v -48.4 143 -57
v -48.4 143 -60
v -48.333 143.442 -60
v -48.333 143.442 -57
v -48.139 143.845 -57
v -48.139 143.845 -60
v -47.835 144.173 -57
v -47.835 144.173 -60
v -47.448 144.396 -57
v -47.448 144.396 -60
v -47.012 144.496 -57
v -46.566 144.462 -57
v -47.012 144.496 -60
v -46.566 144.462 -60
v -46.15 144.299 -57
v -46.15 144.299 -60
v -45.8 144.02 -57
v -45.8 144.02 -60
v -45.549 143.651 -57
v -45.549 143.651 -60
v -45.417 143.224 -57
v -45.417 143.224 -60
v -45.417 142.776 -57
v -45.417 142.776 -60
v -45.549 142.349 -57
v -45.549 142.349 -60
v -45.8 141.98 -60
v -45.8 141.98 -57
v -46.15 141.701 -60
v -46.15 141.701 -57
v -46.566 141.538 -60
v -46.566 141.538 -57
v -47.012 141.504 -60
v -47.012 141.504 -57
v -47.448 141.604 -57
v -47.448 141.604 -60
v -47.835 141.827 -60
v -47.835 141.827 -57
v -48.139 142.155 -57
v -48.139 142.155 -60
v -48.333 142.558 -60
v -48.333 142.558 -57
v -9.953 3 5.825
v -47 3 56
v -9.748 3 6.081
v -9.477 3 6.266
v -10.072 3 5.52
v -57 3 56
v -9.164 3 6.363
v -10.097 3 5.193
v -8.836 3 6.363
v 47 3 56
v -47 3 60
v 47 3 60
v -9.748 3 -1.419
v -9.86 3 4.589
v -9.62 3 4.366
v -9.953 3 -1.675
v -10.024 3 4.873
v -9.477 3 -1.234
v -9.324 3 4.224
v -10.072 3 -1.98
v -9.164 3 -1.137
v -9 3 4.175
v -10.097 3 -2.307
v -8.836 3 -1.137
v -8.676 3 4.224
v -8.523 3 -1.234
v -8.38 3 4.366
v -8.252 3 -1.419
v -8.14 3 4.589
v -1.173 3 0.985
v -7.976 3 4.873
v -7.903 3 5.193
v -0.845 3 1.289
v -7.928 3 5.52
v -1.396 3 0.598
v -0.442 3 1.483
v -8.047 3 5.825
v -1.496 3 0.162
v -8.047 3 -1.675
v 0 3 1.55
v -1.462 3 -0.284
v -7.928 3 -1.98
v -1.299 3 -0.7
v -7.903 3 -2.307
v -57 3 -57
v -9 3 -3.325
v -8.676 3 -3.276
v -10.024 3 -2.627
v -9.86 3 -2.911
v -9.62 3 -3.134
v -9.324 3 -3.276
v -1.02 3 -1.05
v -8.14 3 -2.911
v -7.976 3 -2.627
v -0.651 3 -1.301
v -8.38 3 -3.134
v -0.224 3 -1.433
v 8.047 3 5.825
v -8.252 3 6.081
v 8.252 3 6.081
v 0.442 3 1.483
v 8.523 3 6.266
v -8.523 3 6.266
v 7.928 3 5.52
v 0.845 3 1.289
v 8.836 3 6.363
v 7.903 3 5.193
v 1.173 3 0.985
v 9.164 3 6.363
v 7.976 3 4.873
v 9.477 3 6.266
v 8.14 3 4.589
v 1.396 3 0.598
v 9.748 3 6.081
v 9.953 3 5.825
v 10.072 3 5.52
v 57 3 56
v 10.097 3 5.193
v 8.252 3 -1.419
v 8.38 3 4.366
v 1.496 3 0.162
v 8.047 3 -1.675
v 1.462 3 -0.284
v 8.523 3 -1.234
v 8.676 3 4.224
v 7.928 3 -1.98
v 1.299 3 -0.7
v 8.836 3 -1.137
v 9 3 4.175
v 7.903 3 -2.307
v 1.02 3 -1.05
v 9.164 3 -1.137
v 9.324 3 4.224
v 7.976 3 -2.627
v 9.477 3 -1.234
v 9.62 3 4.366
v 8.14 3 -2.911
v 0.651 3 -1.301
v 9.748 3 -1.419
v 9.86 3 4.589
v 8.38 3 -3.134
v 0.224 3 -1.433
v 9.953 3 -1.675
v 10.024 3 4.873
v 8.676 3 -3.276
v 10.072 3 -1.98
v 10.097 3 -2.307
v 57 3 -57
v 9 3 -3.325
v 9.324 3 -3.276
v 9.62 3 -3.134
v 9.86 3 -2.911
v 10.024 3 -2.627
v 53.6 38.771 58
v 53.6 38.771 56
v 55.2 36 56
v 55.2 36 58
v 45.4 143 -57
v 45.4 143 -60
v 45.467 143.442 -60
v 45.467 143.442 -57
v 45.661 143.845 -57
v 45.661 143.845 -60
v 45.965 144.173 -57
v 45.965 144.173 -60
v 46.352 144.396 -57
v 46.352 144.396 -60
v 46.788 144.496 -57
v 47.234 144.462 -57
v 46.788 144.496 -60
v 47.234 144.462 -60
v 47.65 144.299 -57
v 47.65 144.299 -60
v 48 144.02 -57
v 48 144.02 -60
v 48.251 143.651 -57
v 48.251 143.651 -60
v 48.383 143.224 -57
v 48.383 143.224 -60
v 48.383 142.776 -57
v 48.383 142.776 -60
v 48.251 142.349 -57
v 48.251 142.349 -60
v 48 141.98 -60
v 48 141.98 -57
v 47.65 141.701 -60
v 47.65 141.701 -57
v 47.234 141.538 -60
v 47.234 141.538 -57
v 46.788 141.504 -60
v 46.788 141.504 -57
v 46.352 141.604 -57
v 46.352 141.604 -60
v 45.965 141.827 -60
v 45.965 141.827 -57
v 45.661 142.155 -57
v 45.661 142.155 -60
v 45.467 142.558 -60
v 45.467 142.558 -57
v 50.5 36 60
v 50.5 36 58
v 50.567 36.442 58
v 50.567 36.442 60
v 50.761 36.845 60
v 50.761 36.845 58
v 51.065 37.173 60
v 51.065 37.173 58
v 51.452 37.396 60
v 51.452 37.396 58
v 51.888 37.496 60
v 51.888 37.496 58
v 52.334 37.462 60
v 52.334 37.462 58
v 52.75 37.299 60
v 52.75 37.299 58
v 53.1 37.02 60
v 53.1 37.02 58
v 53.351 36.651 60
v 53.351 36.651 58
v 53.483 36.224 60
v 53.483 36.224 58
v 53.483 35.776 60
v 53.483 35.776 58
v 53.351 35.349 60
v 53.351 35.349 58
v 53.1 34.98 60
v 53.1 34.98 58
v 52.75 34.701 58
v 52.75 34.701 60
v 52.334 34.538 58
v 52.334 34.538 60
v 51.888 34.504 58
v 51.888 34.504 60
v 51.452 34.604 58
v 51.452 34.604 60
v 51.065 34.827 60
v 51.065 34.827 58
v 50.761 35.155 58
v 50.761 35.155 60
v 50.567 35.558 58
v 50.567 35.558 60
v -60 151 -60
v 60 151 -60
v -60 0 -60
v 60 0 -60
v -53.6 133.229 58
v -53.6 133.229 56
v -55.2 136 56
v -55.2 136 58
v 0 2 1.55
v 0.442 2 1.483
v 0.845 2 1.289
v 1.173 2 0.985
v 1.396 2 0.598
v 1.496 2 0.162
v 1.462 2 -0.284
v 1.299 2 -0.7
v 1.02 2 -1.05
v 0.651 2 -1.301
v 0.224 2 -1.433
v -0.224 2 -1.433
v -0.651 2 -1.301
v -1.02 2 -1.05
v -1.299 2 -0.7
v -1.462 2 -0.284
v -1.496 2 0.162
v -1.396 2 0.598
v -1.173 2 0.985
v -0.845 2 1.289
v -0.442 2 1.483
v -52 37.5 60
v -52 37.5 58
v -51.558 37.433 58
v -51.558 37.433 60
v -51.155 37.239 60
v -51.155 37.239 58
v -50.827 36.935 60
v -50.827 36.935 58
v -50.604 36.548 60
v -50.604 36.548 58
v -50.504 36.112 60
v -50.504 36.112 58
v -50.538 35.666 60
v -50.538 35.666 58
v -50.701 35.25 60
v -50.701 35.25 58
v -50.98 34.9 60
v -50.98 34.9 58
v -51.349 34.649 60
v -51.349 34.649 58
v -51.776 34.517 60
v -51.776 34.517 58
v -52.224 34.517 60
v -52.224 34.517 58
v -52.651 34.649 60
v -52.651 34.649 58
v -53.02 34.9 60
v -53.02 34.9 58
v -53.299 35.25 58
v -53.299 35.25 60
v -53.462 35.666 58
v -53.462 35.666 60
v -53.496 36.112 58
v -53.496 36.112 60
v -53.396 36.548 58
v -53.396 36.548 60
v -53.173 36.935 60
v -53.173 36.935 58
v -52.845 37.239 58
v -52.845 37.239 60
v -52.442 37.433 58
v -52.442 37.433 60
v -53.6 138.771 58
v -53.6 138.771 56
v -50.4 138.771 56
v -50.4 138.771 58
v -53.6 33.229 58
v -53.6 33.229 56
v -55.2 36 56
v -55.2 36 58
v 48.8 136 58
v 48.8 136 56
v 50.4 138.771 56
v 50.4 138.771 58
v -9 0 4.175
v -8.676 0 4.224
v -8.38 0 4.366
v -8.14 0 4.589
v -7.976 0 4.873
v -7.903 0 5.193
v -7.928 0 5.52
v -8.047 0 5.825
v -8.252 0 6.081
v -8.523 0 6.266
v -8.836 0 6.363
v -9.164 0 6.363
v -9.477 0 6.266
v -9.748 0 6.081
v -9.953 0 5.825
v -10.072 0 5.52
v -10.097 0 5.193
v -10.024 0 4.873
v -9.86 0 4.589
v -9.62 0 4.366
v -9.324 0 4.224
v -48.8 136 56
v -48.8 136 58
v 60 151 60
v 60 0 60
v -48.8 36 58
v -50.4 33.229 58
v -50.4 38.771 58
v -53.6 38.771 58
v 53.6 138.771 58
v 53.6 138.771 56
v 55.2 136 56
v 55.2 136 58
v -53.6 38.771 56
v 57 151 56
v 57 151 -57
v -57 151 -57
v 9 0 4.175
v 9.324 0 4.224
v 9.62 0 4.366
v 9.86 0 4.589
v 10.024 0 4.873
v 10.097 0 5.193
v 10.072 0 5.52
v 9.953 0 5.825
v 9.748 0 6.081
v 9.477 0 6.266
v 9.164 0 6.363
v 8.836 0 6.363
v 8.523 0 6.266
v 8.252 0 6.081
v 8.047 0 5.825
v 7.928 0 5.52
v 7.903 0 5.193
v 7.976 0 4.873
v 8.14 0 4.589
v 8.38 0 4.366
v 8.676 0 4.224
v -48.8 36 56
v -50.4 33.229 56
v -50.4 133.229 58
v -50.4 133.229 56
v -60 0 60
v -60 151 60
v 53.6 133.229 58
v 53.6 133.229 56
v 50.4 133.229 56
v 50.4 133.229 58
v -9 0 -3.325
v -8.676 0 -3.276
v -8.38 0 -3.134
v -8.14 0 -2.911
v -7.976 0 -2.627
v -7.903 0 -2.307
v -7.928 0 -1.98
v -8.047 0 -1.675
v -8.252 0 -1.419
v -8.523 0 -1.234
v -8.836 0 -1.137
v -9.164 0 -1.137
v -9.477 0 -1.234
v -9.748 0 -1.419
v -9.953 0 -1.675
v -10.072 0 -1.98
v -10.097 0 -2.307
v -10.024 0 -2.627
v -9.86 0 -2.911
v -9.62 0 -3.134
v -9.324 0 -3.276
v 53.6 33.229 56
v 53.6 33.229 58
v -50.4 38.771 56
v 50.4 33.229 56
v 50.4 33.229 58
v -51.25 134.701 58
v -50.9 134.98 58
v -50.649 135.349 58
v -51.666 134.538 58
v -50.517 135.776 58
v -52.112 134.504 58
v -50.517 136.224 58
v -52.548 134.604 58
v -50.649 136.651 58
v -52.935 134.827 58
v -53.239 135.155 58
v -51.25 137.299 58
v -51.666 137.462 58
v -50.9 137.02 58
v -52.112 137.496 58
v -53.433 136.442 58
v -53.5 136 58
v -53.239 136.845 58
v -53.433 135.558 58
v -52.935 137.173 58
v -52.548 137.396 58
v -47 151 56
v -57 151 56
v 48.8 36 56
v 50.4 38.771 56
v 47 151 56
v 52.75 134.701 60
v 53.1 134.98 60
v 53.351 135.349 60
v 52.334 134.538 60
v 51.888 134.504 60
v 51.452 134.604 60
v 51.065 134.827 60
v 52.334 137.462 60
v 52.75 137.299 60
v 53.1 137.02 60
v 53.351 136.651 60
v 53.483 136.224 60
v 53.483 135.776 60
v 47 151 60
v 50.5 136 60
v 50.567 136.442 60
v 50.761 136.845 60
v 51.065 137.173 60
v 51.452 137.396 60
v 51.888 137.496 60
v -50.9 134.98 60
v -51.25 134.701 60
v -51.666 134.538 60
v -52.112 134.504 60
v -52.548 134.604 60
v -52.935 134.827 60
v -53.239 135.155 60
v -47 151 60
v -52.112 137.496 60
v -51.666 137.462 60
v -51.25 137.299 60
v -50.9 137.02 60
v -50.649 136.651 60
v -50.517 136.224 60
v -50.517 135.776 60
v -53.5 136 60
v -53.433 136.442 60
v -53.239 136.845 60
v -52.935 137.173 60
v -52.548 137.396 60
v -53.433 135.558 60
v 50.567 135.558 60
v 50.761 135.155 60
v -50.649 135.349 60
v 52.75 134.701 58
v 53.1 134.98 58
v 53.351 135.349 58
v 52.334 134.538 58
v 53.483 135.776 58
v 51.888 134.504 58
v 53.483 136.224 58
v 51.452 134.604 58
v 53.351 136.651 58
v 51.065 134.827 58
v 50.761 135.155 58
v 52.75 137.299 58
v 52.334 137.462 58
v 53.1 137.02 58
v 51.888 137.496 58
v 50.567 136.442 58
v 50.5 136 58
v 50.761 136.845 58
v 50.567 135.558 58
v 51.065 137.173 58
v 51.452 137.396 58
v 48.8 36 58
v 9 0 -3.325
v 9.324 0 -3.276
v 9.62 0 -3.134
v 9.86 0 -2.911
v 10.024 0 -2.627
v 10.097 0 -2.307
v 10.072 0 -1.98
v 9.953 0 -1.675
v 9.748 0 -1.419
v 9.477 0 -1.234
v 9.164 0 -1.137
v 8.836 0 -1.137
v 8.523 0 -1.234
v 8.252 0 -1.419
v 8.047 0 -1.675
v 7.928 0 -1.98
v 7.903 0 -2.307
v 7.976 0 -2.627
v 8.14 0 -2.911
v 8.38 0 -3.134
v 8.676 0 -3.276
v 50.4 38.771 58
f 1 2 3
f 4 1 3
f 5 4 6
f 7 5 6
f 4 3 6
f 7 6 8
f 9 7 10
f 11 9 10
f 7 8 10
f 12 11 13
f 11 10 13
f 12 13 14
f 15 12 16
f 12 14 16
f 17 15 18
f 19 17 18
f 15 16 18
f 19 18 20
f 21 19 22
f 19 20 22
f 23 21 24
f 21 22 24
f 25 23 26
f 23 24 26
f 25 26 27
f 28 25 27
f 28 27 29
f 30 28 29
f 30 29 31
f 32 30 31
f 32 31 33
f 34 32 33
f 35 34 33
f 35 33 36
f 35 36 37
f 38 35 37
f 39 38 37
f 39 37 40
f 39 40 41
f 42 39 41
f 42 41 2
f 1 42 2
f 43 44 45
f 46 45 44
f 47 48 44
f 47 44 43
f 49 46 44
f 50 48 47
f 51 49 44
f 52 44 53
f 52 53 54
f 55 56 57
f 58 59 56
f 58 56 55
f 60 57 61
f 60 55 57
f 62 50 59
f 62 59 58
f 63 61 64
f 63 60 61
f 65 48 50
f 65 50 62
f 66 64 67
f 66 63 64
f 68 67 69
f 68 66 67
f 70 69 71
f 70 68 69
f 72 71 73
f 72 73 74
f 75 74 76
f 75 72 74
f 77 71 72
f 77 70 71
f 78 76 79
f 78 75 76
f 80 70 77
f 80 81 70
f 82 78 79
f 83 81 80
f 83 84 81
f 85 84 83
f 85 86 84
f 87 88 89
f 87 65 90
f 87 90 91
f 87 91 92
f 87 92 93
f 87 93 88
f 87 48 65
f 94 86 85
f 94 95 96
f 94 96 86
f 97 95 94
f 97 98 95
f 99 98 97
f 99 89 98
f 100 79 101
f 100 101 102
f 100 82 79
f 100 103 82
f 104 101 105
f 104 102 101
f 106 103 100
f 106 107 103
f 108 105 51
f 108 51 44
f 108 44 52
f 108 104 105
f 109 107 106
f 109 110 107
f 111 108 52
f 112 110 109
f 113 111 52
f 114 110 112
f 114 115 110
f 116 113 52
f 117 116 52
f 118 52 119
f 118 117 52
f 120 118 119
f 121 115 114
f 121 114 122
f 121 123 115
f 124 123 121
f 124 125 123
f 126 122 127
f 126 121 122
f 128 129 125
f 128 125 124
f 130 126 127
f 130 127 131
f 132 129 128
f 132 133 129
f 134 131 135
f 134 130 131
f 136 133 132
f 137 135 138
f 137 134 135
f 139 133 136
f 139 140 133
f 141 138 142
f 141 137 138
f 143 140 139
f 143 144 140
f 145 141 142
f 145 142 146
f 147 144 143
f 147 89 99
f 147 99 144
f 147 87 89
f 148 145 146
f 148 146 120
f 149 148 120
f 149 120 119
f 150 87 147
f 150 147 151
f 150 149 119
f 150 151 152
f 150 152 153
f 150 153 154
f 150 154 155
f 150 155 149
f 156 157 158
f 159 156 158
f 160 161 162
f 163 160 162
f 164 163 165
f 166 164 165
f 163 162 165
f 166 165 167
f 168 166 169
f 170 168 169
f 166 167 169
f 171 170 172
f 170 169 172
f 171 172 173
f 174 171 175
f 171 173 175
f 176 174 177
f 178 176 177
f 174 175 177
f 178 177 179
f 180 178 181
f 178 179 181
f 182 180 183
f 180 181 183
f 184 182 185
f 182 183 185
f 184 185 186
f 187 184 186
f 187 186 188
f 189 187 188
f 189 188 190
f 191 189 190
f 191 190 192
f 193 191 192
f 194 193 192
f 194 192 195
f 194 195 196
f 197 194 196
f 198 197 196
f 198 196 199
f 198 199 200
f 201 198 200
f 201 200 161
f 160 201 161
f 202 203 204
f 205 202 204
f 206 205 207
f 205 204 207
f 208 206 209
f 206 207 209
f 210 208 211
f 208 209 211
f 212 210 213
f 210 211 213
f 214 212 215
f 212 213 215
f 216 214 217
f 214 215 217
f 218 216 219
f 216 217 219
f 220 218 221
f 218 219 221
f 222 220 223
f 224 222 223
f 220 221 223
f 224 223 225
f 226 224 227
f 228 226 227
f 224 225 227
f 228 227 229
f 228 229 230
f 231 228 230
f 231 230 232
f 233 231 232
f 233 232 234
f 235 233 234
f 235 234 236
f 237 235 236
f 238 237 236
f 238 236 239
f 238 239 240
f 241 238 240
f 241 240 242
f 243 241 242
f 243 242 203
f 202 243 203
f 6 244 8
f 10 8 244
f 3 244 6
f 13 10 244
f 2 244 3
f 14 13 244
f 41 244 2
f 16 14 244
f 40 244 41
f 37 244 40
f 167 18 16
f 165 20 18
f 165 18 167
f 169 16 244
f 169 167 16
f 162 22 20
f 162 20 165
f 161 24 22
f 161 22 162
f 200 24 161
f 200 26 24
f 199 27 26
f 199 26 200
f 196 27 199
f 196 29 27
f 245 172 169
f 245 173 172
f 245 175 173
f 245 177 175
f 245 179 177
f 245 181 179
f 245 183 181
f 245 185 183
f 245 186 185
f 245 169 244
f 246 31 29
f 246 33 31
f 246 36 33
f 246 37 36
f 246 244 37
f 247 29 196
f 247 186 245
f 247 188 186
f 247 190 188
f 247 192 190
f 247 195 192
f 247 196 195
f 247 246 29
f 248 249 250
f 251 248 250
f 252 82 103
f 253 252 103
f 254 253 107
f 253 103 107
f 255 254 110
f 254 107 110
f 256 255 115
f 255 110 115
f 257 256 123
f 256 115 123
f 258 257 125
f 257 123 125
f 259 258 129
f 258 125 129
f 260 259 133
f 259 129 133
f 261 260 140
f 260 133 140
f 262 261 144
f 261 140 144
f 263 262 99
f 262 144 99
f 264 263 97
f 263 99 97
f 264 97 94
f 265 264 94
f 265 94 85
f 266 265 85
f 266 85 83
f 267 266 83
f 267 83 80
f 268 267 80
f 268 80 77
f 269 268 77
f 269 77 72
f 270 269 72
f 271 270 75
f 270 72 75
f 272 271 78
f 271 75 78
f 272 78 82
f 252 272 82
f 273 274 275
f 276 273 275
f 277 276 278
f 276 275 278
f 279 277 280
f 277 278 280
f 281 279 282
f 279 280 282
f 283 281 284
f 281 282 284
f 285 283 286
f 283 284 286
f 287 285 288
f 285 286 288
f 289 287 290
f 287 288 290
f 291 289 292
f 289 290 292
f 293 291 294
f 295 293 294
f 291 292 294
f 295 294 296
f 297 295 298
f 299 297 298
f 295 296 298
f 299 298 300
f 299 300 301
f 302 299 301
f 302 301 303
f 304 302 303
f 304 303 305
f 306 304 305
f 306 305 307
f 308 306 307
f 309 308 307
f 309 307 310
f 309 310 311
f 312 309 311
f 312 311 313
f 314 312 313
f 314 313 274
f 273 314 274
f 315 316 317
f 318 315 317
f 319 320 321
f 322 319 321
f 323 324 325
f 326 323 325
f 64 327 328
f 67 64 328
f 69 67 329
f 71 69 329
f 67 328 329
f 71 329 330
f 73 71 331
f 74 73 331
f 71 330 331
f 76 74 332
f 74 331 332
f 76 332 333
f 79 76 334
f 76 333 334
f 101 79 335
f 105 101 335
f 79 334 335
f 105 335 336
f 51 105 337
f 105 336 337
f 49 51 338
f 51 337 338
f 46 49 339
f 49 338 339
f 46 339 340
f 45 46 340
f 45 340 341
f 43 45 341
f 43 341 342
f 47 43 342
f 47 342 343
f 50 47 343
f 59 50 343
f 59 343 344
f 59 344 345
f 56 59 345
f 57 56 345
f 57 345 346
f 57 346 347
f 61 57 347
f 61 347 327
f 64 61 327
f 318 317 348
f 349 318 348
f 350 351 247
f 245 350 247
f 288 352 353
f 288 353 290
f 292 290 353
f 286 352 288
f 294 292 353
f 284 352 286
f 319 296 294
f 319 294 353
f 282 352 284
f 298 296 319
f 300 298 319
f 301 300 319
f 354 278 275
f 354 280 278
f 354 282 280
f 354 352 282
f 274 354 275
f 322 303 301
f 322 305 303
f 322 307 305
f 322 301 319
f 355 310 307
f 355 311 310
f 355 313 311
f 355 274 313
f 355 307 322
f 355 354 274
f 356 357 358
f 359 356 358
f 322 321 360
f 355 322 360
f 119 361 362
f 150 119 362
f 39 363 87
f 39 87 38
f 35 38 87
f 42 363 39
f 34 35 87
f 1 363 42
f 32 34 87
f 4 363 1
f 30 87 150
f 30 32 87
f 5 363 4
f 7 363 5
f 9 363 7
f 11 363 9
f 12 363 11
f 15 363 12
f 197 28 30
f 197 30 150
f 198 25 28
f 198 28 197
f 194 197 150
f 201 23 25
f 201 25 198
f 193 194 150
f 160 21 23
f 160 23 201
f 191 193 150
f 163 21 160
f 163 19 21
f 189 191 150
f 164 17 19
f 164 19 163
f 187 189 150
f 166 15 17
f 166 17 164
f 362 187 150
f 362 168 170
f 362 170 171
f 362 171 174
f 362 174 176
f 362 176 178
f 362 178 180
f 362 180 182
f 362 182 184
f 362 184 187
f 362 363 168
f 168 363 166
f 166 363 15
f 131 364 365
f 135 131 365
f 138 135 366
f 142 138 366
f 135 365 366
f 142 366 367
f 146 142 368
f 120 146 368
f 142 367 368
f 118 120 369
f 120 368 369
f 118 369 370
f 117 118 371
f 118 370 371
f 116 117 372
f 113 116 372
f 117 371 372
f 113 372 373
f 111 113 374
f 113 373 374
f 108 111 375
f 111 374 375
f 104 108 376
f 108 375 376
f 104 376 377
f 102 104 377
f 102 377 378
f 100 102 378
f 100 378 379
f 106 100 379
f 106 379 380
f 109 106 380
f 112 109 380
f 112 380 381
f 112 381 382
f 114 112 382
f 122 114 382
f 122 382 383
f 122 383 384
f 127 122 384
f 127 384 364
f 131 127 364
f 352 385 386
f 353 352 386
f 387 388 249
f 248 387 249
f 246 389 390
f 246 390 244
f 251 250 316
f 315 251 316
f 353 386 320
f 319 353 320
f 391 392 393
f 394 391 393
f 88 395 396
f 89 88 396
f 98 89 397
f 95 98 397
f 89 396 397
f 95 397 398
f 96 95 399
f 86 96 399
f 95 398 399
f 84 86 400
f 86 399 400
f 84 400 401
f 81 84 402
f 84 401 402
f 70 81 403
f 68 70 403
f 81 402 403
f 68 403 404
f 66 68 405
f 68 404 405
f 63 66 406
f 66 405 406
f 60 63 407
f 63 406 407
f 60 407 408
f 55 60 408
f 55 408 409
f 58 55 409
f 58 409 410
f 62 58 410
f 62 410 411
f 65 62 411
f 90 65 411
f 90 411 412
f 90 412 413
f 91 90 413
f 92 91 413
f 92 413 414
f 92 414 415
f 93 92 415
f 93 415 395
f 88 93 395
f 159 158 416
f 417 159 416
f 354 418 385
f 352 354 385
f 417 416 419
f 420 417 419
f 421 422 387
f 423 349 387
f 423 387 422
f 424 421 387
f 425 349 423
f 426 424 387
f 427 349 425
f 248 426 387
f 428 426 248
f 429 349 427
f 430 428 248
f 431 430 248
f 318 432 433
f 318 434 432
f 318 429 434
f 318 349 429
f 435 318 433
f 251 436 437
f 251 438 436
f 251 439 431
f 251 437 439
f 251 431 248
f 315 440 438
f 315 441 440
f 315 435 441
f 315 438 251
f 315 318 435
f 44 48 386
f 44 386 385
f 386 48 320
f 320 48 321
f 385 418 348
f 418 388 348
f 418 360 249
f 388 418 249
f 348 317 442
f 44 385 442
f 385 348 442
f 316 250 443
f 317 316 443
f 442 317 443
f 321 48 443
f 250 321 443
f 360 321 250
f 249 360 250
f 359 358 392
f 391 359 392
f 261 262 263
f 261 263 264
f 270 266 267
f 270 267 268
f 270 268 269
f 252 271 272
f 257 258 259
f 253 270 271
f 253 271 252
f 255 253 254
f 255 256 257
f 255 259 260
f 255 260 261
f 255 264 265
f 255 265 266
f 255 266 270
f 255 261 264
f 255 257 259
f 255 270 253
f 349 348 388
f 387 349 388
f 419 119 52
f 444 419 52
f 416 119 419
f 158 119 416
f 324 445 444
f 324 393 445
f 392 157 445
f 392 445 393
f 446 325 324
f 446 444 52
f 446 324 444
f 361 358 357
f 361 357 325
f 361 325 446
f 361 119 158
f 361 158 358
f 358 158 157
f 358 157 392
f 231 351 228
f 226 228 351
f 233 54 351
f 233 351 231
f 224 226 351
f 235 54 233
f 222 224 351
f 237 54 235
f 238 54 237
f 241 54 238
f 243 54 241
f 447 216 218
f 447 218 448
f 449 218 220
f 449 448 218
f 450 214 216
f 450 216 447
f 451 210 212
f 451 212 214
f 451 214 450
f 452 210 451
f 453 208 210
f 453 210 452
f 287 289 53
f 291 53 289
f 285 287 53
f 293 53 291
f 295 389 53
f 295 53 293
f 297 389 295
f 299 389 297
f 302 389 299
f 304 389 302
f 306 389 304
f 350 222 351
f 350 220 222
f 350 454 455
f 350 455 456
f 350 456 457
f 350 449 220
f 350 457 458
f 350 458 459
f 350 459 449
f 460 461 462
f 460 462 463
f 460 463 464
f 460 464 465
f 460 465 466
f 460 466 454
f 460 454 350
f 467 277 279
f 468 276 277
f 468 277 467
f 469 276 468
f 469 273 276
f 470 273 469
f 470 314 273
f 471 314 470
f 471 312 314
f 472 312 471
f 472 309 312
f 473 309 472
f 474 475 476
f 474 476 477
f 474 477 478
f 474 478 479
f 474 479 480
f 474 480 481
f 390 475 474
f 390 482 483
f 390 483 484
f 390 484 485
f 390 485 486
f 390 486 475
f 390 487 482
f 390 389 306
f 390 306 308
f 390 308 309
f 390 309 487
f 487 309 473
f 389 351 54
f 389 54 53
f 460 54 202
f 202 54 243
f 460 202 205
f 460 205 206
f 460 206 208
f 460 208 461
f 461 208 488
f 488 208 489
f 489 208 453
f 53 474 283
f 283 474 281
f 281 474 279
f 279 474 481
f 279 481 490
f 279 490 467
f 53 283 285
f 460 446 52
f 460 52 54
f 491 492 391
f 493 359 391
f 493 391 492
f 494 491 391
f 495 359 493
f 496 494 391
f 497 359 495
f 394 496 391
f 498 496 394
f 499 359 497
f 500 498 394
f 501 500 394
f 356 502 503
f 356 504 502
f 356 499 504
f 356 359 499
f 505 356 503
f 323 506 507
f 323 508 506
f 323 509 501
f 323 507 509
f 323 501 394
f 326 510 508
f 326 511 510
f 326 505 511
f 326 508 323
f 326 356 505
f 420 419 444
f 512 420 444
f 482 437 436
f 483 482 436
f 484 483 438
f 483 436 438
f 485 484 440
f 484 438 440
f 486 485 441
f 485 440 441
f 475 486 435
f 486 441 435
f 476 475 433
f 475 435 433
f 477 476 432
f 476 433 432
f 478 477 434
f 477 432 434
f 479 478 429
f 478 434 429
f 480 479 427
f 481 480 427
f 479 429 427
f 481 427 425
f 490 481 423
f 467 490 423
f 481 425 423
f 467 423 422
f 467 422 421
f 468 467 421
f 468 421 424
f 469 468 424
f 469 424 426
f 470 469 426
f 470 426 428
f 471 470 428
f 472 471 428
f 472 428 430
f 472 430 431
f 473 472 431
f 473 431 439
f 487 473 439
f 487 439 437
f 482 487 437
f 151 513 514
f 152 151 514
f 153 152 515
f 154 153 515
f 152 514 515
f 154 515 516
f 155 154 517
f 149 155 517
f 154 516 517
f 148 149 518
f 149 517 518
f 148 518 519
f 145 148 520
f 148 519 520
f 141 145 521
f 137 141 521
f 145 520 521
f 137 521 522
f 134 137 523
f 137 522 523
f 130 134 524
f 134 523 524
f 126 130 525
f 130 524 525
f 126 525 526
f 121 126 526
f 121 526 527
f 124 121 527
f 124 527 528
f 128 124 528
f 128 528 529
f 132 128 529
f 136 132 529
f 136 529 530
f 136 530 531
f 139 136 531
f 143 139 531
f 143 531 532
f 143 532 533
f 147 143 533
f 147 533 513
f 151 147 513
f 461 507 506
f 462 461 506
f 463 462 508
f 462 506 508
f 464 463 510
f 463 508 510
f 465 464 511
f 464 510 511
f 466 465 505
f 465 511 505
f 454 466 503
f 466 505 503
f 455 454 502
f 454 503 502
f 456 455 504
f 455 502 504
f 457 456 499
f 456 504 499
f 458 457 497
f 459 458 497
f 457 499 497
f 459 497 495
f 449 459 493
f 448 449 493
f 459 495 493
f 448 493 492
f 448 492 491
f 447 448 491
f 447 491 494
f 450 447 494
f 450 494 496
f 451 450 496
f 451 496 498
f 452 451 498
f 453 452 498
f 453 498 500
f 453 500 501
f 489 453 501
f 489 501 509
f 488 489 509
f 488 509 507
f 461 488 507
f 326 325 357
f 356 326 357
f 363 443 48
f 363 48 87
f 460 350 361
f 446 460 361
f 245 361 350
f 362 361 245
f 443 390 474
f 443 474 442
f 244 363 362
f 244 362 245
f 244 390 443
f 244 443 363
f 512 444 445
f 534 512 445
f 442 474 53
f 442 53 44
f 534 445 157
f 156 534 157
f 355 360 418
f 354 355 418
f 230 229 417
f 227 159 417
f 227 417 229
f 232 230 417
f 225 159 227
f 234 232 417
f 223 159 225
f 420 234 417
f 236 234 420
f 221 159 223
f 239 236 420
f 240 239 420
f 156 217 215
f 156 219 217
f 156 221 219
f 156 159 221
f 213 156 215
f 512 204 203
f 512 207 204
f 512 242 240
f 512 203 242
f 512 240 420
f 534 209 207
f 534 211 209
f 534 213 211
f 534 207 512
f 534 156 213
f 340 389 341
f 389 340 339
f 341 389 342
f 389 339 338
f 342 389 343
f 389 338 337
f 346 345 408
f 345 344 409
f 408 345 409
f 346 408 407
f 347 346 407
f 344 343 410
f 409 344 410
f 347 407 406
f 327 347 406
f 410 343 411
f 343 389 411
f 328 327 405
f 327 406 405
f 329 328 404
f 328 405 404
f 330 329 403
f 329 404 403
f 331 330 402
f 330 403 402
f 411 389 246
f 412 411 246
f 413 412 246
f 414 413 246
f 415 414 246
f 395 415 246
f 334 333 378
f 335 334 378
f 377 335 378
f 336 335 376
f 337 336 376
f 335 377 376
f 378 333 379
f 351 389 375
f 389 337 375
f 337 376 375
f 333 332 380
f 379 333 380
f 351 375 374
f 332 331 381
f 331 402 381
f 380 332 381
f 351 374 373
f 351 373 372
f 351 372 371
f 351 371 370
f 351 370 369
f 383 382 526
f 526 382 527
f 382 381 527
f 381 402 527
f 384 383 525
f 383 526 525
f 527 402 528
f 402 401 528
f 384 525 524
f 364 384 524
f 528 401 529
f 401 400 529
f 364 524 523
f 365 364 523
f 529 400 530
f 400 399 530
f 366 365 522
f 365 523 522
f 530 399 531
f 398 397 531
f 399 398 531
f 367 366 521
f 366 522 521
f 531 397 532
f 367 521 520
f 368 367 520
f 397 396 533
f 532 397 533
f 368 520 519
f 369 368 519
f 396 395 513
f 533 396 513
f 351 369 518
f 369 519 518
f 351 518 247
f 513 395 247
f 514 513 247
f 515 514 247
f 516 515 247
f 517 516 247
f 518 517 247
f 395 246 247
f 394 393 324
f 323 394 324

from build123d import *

# Parameters (mm, degrees)
SKETCH1_W                = 120
SKETCH1_H                = 120
MAIN_BODY_DEPTH          = 151
SKETCH11_W               = 114
SKETCH11_H               = 117
HOLLOW_DEPTH             = 148
SKETCH12_W               = 4
SKETCH12_H               = 148
BOSS_EXTRUDE1_DEPTH      = 10
SKETCH13_W               = 4
SKETCH13_H               = 148
BOSS_EXTRUDE2_DEPTH      = 10
LED_MOUNTING_HOLES_REACH = 175.208
SKETCH14_R               = 1.1
SKETCH15_R               = 1.5
LED_POSITION_DEPTH       = 1
BOLT_HOLE_1_REACH        = 203.993
SKETCH16_R               = 1.5
LPATTERN1_COUNT          = 2
LPATTERN1_PITCH          = 93.8
CUT_EXTRUDE5_DEPTH       = 2
SKETCH20_R               = 1.5
CUT_EXTRUDE6_DEPTH       = 10
SKETCH21_R               = 1.5
BOLT_HOLE1_DEPTH         = 10
NUT_HOLE1_DEPTH          = 2
NUT_HOLE3_DEPTH          = 2
SKETCH33_R               = 1.5
BOLT_HOLE3_DEPTH         = 12
NUT_HOLE4_DEPTH          = 2
SKETCH35_R               = 1.5
CUT_EXTRUDE16_DEPTH      = 12


with BuildPart() as part:
    # Sketch1 → Main-Body (new body)
    with BuildSketch(Plane(origin=(0, 0, 0), x_dir=(1, 0, 0), z_dir=(0, 1, 0))):
        Rectangle(SKETCH1_W, SKETCH1_H)
    extrude(amount=MAIN_BODY_DEPTH)

    # Sketch11 → Hollow (cut)
    with BuildSketch(Plane(origin=(0, 151, 0), x_dir=(1, 0, 0), z_dir=(0, 1, 0))):
        with Locations((0, -1.5)):
            Rectangle(SKETCH11_W, SKETCH11_H)
    extrude(amount=-HOLLOW_DEPTH, mode=Mode.SUBTRACT)

    # Sketch12 → Boss-Extrude1 (add)
    with BuildSketch(Plane.ZY.offset(-57)):
        with Locations((58, 77)):
            Rectangle(SKETCH12_W, SKETCH12_H)
    extrude(amount=BOSS_EXTRUDE1_DEPTH)

    # Sketch13 → Boss-Extrude2 (add)
    with BuildSketch(Plane(origin=(-57, 0, 0), x_dir=(0, 0, -1), z_dir=(1, 0, 0))):
        with Locations((-58, 77)):
            Rectangle(SKETCH13_W, SKETCH13_H)
    extrude(amount=BOSS_EXTRUDE2_DEPTH)

    # Sketch14 → LED-Mounting-Holes (cut, up to next)
    with BuildSketch(Plane(origin=(0, 0, 0), x_dir=(0, 0, 1), z_dir=(0, -1, 0)), mode=Mode.PRIVATE) as led_mounting_holes_sk1:
        with Locations(Location((-2.225, 9, 0), (0, 0, 180))):
            Circle(SKETCH14_R)
    led_mounting_holes_tool1 = extrude(led_mounting_holes_sk1.sketch, amount=-LED_MOUNTING_HOLES_REACH, mode=Mode.PRIVATE) & part.part
    # Sketch14 → LED-Mounting-Holes (cut, up to next)
    with BuildSketch(Plane(origin=(0, 0, 0), x_dir=(0, 0, 1), z_dir=(0, -1, 0)), mode=Mode.PRIVATE) as led_mounting_holes_sk2:
        with Locations(Location((5.275, 9, 0), (0, 0, 180))):
            Circle(SKETCH14_R)
    led_mounting_holes_tool2 = extrude(led_mounting_holes_sk2.sketch, amount=-LED_MOUNTING_HOLES_REACH, mode=Mode.PRIVATE) & part.part
    # Sketch14 → LED-Mounting-Holes (cut, up to next)
    with BuildSketch(Plane(origin=(0, 0, 0), x_dir=(0, 0, 1), z_dir=(0, -1, 0)), mode=Mode.PRIVATE) as led_mounting_holes_sk3:
        with Locations(Location((5.275, -9, 0), (0, 0, 180))):
            Circle(SKETCH14_R)
    led_mounting_holes_tool3 = extrude(led_mounting_holes_sk3.sketch, amount=-LED_MOUNTING_HOLES_REACH, mode=Mode.PRIVATE) & part.part
    # Sketch14 → LED-Mounting-Holes (cut, up to next)
    with BuildSketch(Plane(origin=(0, 0, 0), x_dir=(0, 0, 1), z_dir=(0, -1, 0)), mode=Mode.PRIVATE) as led_mounting_holes_sk4:
        with Locations(Location((-2.225, -9, 0), (0, 0, 180))):
            Circle(SKETCH14_R)
    led_mounting_holes_tool4 = extrude(led_mounting_holes_sk4.sketch, amount=-LED_MOUNTING_HOLES_REACH, mode=Mode.PRIVATE) & part.part
    add(led_mounting_holes_tool1.solids().sort_by_distance((-9, 0, -2.225))[0], mode=Mode.SUBTRACT)
    add(led_mounting_holes_tool2.solids().sort_by_distance((-9, 0, 5.275))[0], mode=Mode.SUBTRACT)
    add(led_mounting_holes_tool3.solids().sort_by_distance((9, 0, 5.275))[0], mode=Mode.SUBTRACT)
    add(led_mounting_holes_tool4.solids().sort_by_distance((9, 0, -2.225))[0], mode=Mode.SUBTRACT)

    # Sketch15 → LED-Position (cut)
    with BuildSketch(Plane(origin=(0, 3, 0), x_dir=(1, 0, 0), z_dir=(0, 1, 0))):
        with Locations(Location((0, -0.05, 0), (0, 0, 270))):
            Circle(SKETCH15_R)
    extrude(amount=-LED_POSITION_DEPTH, mode=Mode.SUBTRACT)

    # Sketch16 → Bolt-Hole-1 (cut, up to next)
    with BuildSketch(Plane(origin=(0, 0, -60), x_dir=(-1, 0, 0), z_dir=(0, 0, -1)), mode=Mode.PRIVATE) as bolt_hole_1_sk1:
        with Locations((-46.9, 143)):
            Circle(SKETCH16_R)
    bolt_hole_1_tool1 = extrude(bolt_hole_1_sk1.sketch, amount=-BOLT_HOLE_1_REACH, mode=Mode.PRIVATE) & part.part
    bolt_hole_1 = bolt_hole_1_tool1.solids().sort_by_distance((46.9, 143, -60))[0]
    add(bolt_hole_1, mode=Mode.SUBTRACT)

    # LPattern1: Bolt-Hole-1 ×2
    with Locations(*[(-i * LPATTERN1_PITCH, 0, 0) for i in range(1, LPATTERN1_COUNT)]):
        add(bolt_hole_1, mode=Mode.SUBTRACT)

    # Sketch18 → Cut-Extrude5 (cut)
    with BuildSketch(Plane(origin=(0, 0, 56), x_dir=(-1, 0, 0), z_dir=(0, 0, -1))):
        Polygon((55.2, 136), (53.6, 138.771281292), (50.4, 138.771281292), (48.8, 136), (50.4, 133.228718708), (53.6, 133.228718708), align=None)
    extrude(amount=-CUT_EXTRUDE5_DEPTH, mode=Mode.SUBTRACT)

    # Sketch20 → Cut-Extrude6 (cut)
    with BuildSketch(Plane(origin=(0, 0, 58), x_dir=(-1, 0, 0), z_dir=(0, 0, -1))):
        with Locations((52, 136)):
            Circle(SKETCH20_R)
    extrude(amount=-CUT_EXTRUDE6_DEPTH, mode=Mode.SUBTRACT)

    # Sketch21 → Bolt-Hole1 (cut)
    with BuildSketch(Plane(origin=(0, 0, 56), x_dir=(-1, 0, 0), z_dir=(0, 0, -1))):
        with Locations(Location((52, 36, 0), (0, 0, 90))):
            Circle(SKETCH21_R)
    extrude(amount=-BOLT_HOLE1_DEPTH, mode=Mode.SUBTRACT)

    # Sketch29 → Nut-hole1 (cut)
    with BuildSketch(Plane(origin=(0, 0, 56), x_dir=(-1, 0, 0), z_dir=(0, 0, -1))):
        Polygon((55.2, 36), (53.6, 38.771281292), (50.4, 38.771281292), (48.8, 36), (50.4, 33.228718708), (53.6, 33.228718708), align=None)
    extrude(amount=-NUT_HOLE1_DEPTH, mode=Mode.SUBTRACT)

    # Sketch32 → Nut-Hole3 (cut)
    with BuildSketch(Plane(origin=(0, 0, 56), x_dir=(-1, 0, 0), z_dir=(0, 0, -1))):
        Polygon((-48.8, 136), (-50.4, 138.771281292), (-53.6, 138.771281292), (-55.2, 136), (-53.6, 133.228718708), (-50.4, 133.228718708), align=None)
    extrude(amount=-NUT_HOLE3_DEPTH, mode=Mode.SUBTRACT)

    # Sketch33 → Bolt-Hole3 (cut)
    with BuildSketch(Plane(origin=(0, 0, 56), x_dir=(-1, 0, 0), z_dir=(0, 0, -1))):
        with Locations((-52, 136)):
            Circle(SKETCH33_R)
    extrude(amount=-BOLT_HOLE3_DEPTH, mode=Mode.SUBTRACT)

    # Sketch34 → Nut-hole4 (cut)
    with BuildSketch(Plane(origin=(0, 0, 56), x_dir=(-1, 0, 0), z_dir=(0, 0, -1))):
        Polygon((-48.8, 36), (-50.4, 38.771281292), (-53.6, 38.771281292), (-55.2, 36), (-53.6, 33.228718708), (-50.4, 33.228718708), align=None)
    extrude(amount=-NUT_HOLE4_DEPTH, mode=Mode.SUBTRACT)

    # Sketch35 → Cut-Extrude16 (cut)
    with BuildSketch(Plane(origin=(0, 0, 56), x_dir=(-1, 0, 0), z_dir=(0, 0, -1))):
        with Locations((-52, 36)):
            Circle(SKETCH35_R)
    extrude(amount=-CUT_EXTRUDE16_DEPTH, mode=Mode.SUBTRACT)


solid = part.part
